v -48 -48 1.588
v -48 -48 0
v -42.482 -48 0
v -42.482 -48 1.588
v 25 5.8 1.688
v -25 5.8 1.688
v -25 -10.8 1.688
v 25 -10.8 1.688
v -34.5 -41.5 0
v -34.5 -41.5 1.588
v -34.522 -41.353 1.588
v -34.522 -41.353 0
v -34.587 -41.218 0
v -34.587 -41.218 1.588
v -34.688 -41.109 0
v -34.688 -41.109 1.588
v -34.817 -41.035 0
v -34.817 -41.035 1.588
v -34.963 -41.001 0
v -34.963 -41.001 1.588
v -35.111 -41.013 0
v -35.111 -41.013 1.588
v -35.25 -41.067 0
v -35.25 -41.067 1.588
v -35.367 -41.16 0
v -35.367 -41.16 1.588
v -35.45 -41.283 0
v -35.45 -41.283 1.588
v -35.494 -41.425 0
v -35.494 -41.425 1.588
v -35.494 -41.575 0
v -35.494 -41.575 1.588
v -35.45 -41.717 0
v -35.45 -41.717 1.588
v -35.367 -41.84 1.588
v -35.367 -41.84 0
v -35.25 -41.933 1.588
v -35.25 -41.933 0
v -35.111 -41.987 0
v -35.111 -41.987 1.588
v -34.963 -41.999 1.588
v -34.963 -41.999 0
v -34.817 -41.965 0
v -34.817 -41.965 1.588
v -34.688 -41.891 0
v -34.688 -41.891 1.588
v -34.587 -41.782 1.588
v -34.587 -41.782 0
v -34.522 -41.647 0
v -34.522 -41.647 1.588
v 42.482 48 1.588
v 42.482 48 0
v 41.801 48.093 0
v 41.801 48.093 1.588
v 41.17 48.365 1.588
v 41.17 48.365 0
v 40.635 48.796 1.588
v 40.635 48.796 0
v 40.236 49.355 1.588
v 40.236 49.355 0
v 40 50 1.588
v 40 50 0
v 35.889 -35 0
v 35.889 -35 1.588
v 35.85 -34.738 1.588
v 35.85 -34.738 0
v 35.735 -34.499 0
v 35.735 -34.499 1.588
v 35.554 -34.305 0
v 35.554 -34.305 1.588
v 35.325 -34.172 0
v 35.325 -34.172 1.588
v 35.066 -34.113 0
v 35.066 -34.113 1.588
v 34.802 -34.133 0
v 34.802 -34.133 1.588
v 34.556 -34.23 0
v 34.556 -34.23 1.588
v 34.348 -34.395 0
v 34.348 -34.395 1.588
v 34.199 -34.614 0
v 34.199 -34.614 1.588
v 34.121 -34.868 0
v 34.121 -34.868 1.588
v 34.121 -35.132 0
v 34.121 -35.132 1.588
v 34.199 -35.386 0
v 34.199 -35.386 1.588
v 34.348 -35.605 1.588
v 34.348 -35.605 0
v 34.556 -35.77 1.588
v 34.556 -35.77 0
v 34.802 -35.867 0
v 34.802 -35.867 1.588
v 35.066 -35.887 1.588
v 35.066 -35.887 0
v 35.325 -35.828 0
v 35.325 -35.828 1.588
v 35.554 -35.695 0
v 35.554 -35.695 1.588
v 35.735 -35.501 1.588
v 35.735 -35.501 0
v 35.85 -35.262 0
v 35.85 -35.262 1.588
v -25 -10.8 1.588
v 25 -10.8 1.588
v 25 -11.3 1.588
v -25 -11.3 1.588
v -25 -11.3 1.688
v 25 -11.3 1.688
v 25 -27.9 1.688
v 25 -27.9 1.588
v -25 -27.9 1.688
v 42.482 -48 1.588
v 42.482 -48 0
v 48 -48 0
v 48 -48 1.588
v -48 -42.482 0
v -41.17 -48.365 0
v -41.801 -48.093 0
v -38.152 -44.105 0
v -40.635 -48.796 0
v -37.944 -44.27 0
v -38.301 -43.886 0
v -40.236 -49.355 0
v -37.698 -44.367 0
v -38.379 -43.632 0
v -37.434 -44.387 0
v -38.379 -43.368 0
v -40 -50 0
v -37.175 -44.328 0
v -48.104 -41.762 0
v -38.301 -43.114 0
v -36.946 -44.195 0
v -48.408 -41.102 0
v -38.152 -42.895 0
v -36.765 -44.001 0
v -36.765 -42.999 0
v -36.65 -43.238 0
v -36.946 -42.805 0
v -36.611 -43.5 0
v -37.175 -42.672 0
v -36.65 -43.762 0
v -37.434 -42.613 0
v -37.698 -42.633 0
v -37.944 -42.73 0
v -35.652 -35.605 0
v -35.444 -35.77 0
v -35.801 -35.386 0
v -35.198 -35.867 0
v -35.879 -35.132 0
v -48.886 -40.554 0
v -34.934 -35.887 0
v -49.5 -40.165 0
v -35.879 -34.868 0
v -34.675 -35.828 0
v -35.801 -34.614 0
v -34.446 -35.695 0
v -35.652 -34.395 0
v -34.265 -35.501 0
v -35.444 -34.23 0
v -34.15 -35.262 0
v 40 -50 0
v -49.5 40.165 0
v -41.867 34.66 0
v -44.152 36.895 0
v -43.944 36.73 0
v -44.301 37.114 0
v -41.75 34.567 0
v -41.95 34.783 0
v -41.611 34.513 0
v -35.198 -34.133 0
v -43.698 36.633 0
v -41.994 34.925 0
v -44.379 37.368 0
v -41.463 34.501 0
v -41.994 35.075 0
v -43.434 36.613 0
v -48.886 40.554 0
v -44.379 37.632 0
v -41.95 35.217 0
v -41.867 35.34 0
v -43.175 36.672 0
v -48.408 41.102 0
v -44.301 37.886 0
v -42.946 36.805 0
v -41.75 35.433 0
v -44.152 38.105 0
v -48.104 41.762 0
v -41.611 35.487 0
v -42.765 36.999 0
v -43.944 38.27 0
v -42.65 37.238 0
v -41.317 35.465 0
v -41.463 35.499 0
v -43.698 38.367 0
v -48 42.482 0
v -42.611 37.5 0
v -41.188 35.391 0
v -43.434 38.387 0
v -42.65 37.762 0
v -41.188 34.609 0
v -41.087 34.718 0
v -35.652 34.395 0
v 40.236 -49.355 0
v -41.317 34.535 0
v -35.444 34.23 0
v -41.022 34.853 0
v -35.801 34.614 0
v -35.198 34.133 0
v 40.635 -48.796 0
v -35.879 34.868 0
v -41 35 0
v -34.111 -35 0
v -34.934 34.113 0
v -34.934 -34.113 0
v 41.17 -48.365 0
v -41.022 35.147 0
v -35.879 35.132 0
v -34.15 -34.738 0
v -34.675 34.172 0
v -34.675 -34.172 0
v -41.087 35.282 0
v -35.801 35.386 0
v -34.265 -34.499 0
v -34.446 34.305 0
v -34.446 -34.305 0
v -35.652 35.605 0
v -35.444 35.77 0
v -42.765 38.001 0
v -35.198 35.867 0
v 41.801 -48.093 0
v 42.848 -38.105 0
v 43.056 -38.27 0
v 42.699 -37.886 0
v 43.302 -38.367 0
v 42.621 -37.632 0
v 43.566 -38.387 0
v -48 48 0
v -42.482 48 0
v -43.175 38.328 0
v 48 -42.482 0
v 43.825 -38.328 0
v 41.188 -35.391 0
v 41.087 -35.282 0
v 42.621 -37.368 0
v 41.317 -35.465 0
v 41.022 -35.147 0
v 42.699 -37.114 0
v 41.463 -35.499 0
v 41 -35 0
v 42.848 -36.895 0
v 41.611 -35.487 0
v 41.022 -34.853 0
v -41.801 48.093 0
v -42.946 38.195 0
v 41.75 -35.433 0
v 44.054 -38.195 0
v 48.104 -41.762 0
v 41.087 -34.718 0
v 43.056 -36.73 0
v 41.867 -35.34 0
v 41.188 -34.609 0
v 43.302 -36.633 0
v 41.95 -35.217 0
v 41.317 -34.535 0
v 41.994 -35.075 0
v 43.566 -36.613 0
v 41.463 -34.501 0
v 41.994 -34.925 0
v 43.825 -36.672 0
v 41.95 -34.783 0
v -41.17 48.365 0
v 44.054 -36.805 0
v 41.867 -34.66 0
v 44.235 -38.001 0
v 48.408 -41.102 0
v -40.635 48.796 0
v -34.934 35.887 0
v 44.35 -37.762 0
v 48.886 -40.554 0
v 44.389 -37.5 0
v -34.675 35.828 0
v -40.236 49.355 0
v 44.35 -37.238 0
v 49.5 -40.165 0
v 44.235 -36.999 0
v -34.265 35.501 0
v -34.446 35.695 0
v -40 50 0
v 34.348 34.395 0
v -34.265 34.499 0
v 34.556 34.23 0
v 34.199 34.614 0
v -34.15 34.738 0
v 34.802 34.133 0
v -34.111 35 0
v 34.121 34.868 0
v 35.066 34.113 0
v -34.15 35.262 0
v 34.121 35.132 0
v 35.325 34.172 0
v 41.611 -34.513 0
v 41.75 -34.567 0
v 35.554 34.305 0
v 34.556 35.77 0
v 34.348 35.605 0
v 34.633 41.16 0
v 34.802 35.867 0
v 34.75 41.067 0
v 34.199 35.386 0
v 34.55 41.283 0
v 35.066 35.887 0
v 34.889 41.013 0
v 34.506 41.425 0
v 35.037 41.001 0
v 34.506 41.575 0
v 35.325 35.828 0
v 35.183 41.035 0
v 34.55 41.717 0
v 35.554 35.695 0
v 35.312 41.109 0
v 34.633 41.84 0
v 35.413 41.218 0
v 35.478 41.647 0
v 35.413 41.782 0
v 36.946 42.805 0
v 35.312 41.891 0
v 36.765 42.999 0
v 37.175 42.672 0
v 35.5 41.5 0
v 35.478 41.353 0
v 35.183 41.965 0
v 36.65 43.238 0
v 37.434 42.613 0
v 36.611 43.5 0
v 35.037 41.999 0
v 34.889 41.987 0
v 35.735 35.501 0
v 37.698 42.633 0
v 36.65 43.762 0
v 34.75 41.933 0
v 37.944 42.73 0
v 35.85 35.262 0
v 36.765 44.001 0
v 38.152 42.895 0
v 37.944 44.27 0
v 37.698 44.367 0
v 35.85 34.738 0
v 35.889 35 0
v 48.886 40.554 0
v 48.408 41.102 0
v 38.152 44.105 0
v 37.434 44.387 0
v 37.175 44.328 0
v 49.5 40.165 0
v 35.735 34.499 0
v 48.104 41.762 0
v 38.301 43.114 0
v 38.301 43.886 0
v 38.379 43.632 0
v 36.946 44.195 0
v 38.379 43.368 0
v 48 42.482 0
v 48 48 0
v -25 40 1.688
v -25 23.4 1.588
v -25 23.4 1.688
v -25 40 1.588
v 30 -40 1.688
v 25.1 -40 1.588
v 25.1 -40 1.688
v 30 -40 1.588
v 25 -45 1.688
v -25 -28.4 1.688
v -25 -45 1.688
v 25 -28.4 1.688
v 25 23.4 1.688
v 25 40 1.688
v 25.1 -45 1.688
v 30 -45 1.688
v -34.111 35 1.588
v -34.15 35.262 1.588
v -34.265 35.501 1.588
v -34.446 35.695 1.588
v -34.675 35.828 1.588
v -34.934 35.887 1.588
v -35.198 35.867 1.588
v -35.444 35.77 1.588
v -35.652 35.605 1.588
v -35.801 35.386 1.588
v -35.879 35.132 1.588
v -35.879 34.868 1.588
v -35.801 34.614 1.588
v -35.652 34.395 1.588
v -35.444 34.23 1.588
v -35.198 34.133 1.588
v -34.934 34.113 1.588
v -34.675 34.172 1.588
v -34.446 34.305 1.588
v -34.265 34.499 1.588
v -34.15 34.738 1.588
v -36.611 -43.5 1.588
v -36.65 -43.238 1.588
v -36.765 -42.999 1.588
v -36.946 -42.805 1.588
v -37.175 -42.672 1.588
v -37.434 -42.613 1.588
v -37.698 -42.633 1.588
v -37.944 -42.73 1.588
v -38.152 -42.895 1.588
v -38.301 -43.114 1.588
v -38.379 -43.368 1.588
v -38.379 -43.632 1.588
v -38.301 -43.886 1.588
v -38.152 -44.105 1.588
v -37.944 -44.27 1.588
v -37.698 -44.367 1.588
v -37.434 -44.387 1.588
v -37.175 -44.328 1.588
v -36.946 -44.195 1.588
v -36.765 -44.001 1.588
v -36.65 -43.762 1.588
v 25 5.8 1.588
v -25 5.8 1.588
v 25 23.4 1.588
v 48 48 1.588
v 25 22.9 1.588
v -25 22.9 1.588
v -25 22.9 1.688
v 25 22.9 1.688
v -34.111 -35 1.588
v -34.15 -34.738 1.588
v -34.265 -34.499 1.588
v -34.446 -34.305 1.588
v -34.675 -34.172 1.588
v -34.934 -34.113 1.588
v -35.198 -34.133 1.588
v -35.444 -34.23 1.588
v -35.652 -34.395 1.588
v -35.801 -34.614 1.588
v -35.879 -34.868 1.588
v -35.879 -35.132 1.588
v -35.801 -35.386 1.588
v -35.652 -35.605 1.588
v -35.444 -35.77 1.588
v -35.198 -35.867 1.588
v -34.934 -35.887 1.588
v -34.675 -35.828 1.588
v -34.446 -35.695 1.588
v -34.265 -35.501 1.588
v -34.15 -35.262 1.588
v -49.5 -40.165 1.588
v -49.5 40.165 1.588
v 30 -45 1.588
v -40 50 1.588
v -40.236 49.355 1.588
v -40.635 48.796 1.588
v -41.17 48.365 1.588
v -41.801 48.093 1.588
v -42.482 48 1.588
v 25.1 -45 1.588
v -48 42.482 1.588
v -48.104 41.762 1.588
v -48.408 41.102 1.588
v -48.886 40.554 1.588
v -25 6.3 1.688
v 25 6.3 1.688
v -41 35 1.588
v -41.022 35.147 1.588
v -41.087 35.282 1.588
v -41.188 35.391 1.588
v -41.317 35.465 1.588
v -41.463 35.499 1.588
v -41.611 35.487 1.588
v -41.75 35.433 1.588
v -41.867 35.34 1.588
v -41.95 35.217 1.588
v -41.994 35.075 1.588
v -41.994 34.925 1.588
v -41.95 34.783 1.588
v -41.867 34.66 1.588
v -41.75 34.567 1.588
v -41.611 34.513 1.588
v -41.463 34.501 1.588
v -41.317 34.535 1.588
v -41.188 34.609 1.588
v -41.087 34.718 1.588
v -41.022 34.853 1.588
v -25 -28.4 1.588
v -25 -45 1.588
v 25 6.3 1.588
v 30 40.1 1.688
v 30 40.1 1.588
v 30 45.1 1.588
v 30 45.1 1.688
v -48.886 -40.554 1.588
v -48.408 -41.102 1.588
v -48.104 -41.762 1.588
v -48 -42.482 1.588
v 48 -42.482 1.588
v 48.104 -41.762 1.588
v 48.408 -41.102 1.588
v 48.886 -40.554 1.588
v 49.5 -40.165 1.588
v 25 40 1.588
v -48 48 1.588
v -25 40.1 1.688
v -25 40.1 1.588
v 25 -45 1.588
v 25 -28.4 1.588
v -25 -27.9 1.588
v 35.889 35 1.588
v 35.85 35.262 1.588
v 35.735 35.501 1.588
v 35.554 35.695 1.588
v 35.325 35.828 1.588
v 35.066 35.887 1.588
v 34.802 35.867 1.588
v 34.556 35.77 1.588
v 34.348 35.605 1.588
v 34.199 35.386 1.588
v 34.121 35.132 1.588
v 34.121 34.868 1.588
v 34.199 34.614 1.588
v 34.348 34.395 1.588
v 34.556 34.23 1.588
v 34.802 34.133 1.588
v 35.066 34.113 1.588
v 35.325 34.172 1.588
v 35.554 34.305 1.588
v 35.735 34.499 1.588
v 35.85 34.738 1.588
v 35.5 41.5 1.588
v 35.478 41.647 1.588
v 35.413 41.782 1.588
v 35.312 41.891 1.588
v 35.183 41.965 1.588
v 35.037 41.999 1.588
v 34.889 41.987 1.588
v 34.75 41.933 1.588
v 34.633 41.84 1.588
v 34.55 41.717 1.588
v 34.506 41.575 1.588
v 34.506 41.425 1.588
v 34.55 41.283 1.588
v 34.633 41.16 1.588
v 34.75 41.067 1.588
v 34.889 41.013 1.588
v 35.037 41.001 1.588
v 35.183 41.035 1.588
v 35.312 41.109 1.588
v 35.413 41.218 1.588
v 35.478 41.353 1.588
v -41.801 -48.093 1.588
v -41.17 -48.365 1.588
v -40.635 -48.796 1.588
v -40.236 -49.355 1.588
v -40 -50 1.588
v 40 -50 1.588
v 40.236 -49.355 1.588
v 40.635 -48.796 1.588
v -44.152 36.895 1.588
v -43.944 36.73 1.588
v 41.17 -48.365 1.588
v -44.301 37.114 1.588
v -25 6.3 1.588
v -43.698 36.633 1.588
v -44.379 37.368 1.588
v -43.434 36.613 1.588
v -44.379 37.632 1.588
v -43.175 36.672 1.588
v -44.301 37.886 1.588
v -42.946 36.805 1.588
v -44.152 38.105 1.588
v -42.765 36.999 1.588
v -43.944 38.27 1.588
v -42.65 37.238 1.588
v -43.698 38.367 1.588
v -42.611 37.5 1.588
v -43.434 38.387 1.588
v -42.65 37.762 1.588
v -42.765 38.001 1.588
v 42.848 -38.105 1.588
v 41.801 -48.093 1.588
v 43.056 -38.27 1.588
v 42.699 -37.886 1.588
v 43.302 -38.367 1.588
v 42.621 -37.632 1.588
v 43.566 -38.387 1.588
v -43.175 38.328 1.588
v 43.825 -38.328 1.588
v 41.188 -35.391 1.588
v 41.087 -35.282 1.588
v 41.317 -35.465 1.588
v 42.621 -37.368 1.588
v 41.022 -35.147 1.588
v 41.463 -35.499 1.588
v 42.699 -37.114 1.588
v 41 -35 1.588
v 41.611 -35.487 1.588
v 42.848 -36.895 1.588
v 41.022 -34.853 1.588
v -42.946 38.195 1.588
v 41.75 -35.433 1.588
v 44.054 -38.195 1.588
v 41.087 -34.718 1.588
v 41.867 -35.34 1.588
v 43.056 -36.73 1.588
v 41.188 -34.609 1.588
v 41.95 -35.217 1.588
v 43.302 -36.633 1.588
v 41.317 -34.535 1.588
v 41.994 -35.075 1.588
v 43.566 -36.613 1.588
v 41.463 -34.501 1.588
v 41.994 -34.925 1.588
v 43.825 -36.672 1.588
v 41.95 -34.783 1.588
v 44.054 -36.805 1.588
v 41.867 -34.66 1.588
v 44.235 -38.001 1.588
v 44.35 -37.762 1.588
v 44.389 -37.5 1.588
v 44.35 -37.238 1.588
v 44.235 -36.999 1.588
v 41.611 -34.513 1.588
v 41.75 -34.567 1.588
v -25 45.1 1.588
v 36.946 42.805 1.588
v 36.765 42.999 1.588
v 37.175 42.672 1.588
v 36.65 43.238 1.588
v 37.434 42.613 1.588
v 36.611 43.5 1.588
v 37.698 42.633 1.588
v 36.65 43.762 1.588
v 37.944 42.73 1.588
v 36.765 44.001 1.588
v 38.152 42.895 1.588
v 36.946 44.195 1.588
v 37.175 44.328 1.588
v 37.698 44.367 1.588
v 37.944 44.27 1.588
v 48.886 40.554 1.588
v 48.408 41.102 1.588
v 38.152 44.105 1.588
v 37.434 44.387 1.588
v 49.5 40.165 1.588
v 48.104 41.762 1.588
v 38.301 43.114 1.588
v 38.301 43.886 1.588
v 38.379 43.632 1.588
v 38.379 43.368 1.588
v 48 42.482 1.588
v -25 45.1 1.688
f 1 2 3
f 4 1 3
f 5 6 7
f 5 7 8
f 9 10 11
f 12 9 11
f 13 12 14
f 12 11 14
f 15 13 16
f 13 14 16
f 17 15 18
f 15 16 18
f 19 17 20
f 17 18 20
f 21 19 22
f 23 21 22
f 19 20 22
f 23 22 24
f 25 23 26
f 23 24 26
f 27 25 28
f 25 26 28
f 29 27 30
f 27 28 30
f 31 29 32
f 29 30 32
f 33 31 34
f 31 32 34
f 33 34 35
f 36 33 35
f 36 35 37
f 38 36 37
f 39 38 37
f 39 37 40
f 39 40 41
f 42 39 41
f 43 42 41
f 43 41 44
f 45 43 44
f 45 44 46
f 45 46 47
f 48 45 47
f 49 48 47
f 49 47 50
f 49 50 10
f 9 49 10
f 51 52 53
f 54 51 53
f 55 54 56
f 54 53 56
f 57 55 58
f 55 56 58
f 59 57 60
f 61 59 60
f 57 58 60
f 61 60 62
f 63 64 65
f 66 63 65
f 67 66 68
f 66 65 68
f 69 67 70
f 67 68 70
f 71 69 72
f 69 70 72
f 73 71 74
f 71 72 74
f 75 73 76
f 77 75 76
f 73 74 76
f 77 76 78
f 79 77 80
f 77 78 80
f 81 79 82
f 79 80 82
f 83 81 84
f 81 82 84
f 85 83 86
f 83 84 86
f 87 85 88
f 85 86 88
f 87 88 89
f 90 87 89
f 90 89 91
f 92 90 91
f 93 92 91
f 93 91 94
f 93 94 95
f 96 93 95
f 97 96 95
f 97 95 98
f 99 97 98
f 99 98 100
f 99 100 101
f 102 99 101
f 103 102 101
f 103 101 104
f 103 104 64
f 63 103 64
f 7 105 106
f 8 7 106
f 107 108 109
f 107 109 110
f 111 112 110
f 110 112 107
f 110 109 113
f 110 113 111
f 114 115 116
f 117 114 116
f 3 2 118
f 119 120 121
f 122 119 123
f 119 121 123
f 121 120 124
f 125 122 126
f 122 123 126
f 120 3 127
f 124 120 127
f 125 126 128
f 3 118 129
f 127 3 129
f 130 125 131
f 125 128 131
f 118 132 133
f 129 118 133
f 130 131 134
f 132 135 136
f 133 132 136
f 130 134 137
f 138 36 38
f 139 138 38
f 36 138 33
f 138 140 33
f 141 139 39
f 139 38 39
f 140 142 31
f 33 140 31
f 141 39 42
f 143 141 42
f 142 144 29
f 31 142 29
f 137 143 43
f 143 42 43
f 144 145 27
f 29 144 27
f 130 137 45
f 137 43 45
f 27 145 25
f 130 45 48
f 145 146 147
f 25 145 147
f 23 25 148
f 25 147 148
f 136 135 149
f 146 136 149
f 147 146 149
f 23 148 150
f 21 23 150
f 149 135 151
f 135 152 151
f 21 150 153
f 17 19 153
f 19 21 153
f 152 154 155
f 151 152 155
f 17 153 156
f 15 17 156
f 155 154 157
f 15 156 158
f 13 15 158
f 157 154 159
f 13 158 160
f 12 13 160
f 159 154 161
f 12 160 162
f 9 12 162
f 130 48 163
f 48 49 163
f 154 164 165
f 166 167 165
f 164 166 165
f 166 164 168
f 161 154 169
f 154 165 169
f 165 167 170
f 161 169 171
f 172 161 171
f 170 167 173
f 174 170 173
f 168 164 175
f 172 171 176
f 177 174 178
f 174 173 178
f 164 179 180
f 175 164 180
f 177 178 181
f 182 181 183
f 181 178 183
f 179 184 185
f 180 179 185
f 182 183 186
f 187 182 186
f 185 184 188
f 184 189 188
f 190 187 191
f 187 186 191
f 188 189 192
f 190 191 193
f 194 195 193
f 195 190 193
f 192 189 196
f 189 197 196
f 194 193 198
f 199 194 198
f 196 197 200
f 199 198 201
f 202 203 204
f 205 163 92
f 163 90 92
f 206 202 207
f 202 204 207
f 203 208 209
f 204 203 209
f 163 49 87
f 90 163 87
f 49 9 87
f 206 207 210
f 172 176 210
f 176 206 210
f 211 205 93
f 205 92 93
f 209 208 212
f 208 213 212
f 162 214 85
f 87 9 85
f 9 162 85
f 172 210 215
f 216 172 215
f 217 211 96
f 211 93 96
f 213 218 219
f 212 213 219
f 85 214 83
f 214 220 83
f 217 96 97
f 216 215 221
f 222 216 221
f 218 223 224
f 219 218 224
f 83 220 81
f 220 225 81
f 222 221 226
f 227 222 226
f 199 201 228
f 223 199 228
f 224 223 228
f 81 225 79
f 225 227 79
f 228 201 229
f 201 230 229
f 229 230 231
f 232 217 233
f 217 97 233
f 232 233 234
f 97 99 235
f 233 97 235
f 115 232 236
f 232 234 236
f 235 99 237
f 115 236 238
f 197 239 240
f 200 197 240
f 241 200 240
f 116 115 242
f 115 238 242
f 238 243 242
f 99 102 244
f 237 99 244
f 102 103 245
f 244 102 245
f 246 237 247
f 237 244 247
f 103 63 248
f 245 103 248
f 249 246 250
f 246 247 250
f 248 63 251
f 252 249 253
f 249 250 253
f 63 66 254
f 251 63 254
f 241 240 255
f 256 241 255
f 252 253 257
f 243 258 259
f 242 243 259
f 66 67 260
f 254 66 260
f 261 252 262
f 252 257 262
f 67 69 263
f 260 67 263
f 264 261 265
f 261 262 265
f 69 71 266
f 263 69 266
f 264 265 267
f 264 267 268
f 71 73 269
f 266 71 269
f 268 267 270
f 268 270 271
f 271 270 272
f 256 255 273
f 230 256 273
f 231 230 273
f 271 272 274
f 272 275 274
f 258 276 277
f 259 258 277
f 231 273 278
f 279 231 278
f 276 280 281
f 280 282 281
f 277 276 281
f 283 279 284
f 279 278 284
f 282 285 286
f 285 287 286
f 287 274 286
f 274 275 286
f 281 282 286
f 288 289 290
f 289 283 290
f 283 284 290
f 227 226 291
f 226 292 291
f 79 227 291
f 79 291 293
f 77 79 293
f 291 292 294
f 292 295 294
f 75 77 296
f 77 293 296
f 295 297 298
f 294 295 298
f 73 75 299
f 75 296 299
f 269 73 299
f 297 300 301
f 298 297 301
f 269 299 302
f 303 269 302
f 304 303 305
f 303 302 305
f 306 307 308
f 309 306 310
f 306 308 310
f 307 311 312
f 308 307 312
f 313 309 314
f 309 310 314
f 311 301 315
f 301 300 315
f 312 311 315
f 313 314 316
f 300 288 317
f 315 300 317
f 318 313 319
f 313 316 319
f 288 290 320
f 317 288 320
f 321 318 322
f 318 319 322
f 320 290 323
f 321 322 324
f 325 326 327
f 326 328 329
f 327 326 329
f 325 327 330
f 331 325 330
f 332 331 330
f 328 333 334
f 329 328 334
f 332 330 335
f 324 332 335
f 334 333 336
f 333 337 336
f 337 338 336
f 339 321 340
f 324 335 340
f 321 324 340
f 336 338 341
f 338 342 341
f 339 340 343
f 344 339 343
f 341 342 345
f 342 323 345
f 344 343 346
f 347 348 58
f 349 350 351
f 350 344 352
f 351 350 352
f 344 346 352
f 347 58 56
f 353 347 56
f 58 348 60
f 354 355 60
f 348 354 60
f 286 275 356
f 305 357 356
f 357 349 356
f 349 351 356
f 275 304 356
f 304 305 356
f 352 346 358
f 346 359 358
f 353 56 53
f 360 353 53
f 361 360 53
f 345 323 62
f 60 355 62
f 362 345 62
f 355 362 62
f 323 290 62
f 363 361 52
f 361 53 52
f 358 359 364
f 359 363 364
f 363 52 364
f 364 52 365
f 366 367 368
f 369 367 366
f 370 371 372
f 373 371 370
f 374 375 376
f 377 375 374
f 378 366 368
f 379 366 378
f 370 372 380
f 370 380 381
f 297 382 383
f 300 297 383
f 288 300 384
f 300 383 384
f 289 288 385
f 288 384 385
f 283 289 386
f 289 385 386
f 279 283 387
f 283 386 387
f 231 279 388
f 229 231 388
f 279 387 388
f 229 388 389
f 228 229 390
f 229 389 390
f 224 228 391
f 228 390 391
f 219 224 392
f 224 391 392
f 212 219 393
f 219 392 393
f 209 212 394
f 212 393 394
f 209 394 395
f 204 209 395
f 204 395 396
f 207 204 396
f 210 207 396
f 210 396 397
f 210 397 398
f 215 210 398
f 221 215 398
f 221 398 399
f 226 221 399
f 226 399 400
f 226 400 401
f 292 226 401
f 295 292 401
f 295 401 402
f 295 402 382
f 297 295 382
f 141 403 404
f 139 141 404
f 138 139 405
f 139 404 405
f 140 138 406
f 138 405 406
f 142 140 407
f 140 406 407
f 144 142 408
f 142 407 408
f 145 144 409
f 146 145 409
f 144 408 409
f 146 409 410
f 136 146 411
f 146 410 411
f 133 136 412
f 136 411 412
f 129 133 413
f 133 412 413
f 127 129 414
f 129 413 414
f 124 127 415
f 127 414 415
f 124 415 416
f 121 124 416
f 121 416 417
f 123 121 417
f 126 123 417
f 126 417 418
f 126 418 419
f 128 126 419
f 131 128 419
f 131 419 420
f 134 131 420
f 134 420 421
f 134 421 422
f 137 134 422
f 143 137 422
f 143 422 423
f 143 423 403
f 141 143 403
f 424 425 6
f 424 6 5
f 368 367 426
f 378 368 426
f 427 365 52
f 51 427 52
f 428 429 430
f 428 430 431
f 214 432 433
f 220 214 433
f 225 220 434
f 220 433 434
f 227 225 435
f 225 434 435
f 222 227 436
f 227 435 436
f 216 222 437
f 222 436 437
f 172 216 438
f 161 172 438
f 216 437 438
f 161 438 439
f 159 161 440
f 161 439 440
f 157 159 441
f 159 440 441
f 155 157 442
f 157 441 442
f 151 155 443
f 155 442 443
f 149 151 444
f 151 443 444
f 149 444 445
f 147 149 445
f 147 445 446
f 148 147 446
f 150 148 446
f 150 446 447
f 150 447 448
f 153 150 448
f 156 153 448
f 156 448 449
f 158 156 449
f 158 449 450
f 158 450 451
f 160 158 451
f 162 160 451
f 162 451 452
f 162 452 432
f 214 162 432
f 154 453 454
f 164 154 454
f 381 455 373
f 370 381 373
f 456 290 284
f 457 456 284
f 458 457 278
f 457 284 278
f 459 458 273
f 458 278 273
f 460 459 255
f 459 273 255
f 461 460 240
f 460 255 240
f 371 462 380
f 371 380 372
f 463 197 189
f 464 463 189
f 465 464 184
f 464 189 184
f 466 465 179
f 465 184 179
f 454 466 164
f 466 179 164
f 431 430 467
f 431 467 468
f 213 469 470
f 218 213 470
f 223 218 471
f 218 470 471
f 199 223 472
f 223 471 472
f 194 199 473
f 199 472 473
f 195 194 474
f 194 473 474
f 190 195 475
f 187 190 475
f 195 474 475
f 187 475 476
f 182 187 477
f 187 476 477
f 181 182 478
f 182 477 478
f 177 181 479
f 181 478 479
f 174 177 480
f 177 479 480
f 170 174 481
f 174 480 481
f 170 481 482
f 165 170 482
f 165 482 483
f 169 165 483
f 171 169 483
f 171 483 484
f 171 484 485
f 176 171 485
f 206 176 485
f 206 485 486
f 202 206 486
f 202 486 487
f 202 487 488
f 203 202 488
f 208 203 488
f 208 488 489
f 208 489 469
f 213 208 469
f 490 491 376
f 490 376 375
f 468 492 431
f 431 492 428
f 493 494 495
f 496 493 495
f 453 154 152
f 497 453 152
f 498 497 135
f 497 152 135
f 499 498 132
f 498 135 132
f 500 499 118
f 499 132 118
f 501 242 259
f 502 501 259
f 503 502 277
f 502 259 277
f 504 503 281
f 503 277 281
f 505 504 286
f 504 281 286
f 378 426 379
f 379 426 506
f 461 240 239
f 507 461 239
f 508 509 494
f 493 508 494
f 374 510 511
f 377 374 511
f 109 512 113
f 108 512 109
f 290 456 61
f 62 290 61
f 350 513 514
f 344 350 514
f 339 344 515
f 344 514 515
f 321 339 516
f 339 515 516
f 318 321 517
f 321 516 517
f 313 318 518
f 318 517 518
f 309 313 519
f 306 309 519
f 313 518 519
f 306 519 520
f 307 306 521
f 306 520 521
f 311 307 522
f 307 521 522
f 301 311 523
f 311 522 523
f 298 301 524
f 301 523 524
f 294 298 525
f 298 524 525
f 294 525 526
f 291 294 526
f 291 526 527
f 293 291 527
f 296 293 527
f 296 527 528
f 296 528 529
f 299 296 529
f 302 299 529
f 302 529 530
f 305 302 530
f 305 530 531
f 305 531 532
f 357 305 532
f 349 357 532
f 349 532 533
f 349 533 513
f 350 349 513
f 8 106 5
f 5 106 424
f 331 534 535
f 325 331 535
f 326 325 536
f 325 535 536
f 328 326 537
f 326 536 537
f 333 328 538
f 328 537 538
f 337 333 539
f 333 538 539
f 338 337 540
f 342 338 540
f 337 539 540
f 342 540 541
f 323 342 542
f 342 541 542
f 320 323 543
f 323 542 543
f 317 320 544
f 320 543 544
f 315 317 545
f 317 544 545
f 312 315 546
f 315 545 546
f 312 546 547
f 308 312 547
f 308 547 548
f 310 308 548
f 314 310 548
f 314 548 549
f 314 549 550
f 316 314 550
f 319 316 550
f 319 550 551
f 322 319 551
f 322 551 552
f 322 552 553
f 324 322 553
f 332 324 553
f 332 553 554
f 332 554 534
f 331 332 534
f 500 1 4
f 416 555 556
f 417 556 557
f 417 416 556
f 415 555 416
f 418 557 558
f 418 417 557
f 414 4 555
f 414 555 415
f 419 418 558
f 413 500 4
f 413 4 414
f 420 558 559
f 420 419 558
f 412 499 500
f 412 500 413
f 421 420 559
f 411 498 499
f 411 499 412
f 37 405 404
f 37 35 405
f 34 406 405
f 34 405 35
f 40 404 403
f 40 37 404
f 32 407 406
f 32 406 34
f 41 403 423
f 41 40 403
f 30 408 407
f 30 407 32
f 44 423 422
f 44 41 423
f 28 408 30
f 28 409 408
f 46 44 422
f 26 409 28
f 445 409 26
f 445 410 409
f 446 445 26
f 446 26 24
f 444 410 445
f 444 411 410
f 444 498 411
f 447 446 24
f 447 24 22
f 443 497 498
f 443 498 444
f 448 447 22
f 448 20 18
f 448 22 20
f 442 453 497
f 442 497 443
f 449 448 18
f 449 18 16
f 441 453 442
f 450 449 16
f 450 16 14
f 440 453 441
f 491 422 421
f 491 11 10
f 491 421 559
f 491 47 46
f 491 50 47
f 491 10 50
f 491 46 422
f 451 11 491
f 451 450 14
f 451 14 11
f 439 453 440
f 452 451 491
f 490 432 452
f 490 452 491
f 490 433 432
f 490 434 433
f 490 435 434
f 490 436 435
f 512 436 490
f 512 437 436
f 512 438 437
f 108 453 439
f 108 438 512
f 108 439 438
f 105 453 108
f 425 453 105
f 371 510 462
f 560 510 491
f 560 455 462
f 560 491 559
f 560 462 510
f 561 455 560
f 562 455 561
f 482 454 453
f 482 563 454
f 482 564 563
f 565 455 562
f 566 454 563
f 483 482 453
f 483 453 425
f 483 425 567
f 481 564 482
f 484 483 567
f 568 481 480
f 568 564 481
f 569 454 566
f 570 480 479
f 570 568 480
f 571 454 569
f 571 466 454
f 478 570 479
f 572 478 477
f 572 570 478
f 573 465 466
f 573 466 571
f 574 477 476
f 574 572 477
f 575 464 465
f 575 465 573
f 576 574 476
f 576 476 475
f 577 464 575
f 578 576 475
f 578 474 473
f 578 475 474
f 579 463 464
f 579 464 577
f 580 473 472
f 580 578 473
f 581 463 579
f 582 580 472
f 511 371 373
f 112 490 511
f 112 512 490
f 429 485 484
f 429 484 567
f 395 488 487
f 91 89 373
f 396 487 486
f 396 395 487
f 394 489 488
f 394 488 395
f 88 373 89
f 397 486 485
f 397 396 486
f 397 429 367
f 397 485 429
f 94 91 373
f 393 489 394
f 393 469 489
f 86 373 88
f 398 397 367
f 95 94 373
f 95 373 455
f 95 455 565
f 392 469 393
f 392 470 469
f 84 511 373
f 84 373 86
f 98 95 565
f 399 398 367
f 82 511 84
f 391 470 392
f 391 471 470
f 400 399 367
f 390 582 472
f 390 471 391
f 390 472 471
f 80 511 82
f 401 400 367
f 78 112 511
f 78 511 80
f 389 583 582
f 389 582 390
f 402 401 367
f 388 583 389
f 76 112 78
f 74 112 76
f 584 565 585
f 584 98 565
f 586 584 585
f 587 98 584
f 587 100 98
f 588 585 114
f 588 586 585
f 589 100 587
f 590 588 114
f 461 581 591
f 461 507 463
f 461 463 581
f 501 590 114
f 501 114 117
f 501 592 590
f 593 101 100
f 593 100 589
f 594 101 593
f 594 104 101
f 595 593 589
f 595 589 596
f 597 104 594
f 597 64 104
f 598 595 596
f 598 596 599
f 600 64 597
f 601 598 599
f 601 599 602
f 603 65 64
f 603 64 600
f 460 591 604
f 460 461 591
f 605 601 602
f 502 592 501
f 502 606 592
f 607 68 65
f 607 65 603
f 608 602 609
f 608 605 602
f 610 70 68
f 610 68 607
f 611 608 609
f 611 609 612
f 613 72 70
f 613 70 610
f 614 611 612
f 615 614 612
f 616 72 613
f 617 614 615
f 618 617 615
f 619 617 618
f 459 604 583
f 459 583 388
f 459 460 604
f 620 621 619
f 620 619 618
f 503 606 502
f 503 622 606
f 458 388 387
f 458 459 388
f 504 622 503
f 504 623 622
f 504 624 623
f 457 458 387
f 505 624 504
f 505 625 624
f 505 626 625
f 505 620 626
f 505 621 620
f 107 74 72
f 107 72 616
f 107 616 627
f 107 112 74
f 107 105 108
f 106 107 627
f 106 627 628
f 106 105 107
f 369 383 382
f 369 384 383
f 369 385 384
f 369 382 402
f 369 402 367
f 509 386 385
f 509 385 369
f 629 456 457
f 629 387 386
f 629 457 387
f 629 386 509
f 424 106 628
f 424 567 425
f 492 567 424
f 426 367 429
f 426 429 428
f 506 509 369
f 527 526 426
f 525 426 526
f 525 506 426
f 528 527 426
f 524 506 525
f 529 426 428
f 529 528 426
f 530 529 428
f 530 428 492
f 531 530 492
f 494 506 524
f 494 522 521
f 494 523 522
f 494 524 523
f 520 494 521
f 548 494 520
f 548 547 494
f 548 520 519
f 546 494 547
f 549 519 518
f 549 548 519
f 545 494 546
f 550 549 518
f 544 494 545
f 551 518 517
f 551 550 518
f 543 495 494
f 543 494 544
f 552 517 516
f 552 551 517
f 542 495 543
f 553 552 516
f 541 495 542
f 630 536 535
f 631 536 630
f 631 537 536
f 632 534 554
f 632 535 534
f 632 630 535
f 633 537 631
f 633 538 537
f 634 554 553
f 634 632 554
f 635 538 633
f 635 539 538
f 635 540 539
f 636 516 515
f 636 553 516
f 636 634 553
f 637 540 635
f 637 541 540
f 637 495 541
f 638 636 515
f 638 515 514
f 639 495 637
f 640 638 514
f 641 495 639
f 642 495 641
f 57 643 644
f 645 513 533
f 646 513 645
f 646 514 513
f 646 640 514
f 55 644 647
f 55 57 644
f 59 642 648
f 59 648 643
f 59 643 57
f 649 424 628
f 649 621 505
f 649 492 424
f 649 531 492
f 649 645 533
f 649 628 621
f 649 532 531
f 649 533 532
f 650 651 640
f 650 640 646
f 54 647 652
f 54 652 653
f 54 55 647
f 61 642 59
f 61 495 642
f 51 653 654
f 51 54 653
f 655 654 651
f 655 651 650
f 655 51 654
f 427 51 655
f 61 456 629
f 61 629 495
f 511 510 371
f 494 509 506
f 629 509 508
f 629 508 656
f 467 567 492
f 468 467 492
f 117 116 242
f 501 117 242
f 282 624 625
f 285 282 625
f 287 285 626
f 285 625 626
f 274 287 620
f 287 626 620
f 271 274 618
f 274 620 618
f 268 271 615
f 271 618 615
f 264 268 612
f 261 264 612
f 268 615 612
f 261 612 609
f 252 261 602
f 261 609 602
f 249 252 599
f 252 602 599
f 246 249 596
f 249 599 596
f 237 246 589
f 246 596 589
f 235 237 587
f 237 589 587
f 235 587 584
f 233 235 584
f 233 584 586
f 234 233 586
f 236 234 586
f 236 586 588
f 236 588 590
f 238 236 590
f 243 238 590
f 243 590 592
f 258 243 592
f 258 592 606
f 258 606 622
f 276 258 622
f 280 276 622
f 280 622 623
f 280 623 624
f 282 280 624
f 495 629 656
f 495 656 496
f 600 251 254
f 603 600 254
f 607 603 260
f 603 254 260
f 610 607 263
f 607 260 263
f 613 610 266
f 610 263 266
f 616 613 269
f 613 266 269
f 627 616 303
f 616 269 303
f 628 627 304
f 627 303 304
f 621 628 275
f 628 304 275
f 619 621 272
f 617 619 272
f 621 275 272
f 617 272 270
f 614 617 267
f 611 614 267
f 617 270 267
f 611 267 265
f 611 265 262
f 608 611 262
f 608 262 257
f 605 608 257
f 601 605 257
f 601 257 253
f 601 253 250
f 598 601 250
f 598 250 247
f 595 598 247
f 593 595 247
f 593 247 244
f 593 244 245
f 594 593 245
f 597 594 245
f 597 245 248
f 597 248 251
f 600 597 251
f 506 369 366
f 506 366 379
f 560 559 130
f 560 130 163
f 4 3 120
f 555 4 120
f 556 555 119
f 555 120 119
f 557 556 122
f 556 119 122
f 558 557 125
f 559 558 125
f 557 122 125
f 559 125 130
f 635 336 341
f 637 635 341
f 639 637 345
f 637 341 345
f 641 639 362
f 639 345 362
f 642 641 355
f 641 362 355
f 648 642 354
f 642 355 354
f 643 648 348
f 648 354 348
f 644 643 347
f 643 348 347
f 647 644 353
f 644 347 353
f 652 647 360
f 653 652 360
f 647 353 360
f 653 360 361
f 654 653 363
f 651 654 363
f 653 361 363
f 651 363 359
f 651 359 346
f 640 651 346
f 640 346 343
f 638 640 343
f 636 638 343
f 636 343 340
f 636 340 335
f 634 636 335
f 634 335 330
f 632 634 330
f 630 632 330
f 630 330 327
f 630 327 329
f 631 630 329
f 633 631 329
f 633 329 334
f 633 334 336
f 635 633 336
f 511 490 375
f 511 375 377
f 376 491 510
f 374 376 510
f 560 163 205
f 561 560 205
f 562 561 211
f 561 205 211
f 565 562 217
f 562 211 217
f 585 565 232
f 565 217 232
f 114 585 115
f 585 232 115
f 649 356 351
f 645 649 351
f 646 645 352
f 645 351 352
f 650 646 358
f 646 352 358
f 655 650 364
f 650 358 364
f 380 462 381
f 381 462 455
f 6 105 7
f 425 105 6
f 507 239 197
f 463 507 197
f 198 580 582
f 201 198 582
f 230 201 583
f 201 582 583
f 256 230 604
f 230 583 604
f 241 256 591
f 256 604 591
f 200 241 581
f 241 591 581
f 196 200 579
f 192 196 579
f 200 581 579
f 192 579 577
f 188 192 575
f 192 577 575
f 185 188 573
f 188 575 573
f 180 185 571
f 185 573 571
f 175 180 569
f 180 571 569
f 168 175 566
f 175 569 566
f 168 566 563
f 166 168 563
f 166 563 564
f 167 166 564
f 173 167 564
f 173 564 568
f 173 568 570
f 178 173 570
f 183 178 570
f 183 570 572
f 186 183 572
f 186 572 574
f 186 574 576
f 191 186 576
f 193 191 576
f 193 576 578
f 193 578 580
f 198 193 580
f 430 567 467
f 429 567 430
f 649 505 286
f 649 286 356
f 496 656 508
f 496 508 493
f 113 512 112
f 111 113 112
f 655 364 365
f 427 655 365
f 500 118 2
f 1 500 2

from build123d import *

# Parameters (mm, degrees)
SKETCH1_W                      = 99
SKETCH1_H                      = 100
BOSS_EXTRUDE1_DEPTH            = 1.5875
CUT_EXTRUDE1_DEPTH             = 71.375920287
CUT_EXTRUDE2_DEPTH             = 71.375920287
CUT_EXTRUDE3_DEPTH             = 71.375920287
CUT_EXTRUDE4_DEPTH             = 71.375920287
CUT_EXTRUDE5_DEPTH             = 71.375920287
CUT_EXTRUDE6_DEPTH             = 71.375920287
CUT_EXTRUDE7_DEPTH             = 71.375920287
CUT_EXTRUDE8_DEPTH             = 71.375920287
SKETCH10_W                     = 50
SKETCH10_H                     = 16.6
BOSS_EXTRUDE2_DEPTH            = 0.1
SKETCH11_W                     = 50
SKETCH11_H                     = 16.6
BOSS_EXTRUDE3_DEPTH            = 0.1
SKETCH12_W                     = 50
SKETCH12_H                     = 16.6
BOSS_EXTRUDE4_DEPTH            = 0.1
SKETCH13_W                     = 50
SKETCH13_H                     = 16.6
BOSS_EXTRUDE5_DEPTH            = 0.1
SKETCH14_W                     = 50
SKETCH14_H                     = 16.6
BOSS_EXTRUDE6_DEPTH            = 0.1
SKETCH15_W                     = 55
SKETCH15_H                     = 5
BOSS_EXTRUDE7_DEPTH            = 0.1
SKETCH16_W                     = 4.9
SKETCH16_H                     = 5
BOSS_EXTRUDE8_DEPTH            = 0.1
F_000_CLEARANCE_HOLE1_D        = 1
F_000_CLEARANCE_HOLE2_D        = 1
F_000_CLEARANCE_HOLE2_DEPTH    = 1.6875
F_50_0_07_DIAMETER_HOLE1_D     = 1.778
F_50_0_07_DIAMETER_HOLE1_DEPTH = 1.6875
F_50_0_07_DIAMETER_HOLE2_D     = 1.778


with BuildPart() as part:
    # Sketch1 → Boss-Extrude1 (new body)
    with BuildSketch(Plane.XY.offset(1.5875)):
        Rectangle(SKETCH1_W, SKETCH1_H)
    extrude(amount=-BOSS_EXTRUDE1_DEPTH)

    # Sketch2 → Cut-Extrude1 (cut, through all)
    with BuildSketch(Plane(origin=(0, 0, 0), x_dir=(-1, 0, 0), z_dir=(0, 0, -1))):
        with BuildLine():
            Line((48, -42.481934729), (48, -50))
            Line((48, -50), (49.5, -50))
            Line((49.5, -50), (49.5, -40.164608684))
            ThreePointArc((49.5, -40.164608684), (48.40772422, -41.101717355), (48, -42.481934729))
        make_face()
    extrude(amount=-CUT_EXTRUDE1_DEPTH, mode=Mode.SUBTRACT)

    # Sketch3 → Cut-Extrude2 (cut, through all)
    with BuildSketch(Plane(origin=(0, 0, 0), x_dir=(-1, 0, 0), z_dir=(0, 0, -1))):
        with BuildLine():
            Line((48, -48), (42.481934729, -48))
            ThreePointArc((42.481934729, -48), (40.888196984, -48.562223471), (40, -50))
            Line((40, -50), (48, -50))
            Line((48, -50), (48, -48))
        make_face()
    extrude(amount=-CUT_EXTRUDE2_DEPTH, mode=Mode.SUBTRACT)

    # Sketch4 → Cut-Extrude3 (cut, through all)
    with BuildSketch(Plane(origin=(0, 0, 0), x_dir=(-1, 0, 0), z_dir=(0, 0, -1))):
        with BuildLine():
            Line((-42.481934729, -48), (-49.5, -48))
            Line((-49.5, -48), (-49.5, -50))
            Line((-49.5, -50), (-40, -50))
            ThreePointArc((-40, -50), (-40.888196984, -48.562223471), (-42.481934729, -48))
        make_face()
    extrude(amount=-CUT_EXTRUDE3_DEPTH, mode=Mode.SUBTRACT)

    # Sketch5 → Cut-Extrude4 (cut, through all)
    with BuildSketch(Plane(origin=(0, 0, 0), x_dir=(-1, 0, 0), z_dir=(0, 0, -1))):
        with BuildLine():
            Line((-48, -48), (-48, -42.481934729))
            ThreePointArc((-48, -42.481934729), (-48.40772422, -41.101717355), (-49.5, -40.164608684))
            Line((-49.5, -40.164608684), (-49.5, -48))
            Line((-49.5, -48), (-48, -48))
        make_face()
    extrude(amount=-CUT_EXTRUDE4_DEPTH, mode=Mode.SUBTRACT)

    # Sketch6 → Cut-Extrude5 (cut, through all)
    with BuildSketch(Plane(origin=(0, 0, 0), x_dir=(-1, 0, 0), z_dir=(0, 0, -1))):
        with BuildLine():
            Line((-48, 42.481934729), (-48, 50))
            Line((-48, 50), (-49.5, 50))
            Line((-49.5, 50), (-49.5, 40.164608684))
            ThreePointArc((-49.5, 40.164608684), (-48.40772422, 41.101717355), (-48, 42.481934729))
        make_face()
    extrude(amount=-CUT_EXTRUDE5_DEPTH, mode=Mode.SUBTRACT)

    # Sketch7 → Cut-Extrude6 (cut, through all)
    with BuildSketch(Plane(origin=(0, 0, 0), x_dir=(-1, 0, 0), z_dir=(0, 0, -1))):
        with BuildLine():
            Line((-48, 48), (-42.481934729, 48))
            ThreePointArc((-42.481934729, 48), (-40.888196984, 48.562223471), (-40, 50))
            Line((-40, 50), (-48, 50))
            Line((-48, 50), (-48, 48))
        make_face()
    extrude(amount=-CUT_EXTRUDE6_DEPTH, mode=Mode.SUBTRACT)

    # Sketch8 → Cut-Extrude7 (cut, through all)
    with BuildSketch(Plane(origin=(0, 0, 0), x_dir=(-1, 0, 0), z_dir=(0, 0, -1))):
        with BuildLine():
            Line((42.481934729, 48), (49.5, 48))
            Line((49.5, 48), (49.5, 50))
            Line((49.5, 50), (40, 50))
            ThreePointArc((40, 50), (40.888196984, 48.562223471), (42.481934729, 48))
        make_face()
    extrude(amount=-CUT_EXTRUDE7_DEPTH, mode=Mode.SUBTRACT)

    # Sketch9 → Cut-Extrude8 (cut, through all)
    with BuildSketch(Plane(origin=(0, 0, 0), x_dir=(-1, 0, 0), z_dir=(0, 0, -1))):
        with BuildLine():
            Line((48, 48), (48, 42.481934729))
            ThreePointArc((48, 42.481934729), (48.40772422, 41.101717355), (49.5, 40.164608684))
            Line((49.5, 40.164608684), (49.5, 48))
            Line((49.5, 48), (48, 48))
        make_face()
    extrude(amount=-CUT_EXTRUDE8_DEPTH, mode=Mode.SUBTRACT)

    # Sketch10 → Boss-Extrude2 (add)
    with BuildSketch(Plane.XY.offset(1.5875)):
        with Locations((0, 31.7)):
            Rectangle(SKETCH10_W, SKETCH10_H)
    extrude(amount=BOSS_EXTRUDE2_DEPTH)

    # Sketch11 → Boss-Extrude3 (add)
    with BuildSketch(Plane.XY.offset(1.5875)):
        with Locations((0, 14.6)):
            Rectangle(SKETCH11_W, SKETCH11_H)
    extrude(amount=BOSS_EXTRUDE3_DEPTH)

    # Sketch12 → Boss-Extrude4 (add)
    with BuildSketch(Plane.XY.offset(1.5875)):
        with Locations((0, -2.5)):
            Rectangle(SKETCH12_W, SKETCH12_H)
    extrude(amount=BOSS_EXTRUDE4_DEPTH)

    # Sketch13 → Boss-Extrude5 (add)
    with BuildSketch(Plane.XY.offset(1.5875)):
        with Locations((0, -19.6)):
            Rectangle(SKETCH13_W, SKETCH13_H)
    extrude(amount=BOSS_EXTRUDE5_DEPTH)

    # Sketch14 → Boss-Extrude6 (add)
    with BuildSketch(Plane.XY.offset(1.5875)):
        with Locations((0, -36.7)):
            Rectangle(SKETCH14_W, SKETCH14_H)
    extrude(amount=BOSS_EXTRUDE6_DEPTH)

    # Sketch15 → Boss-Extrude7 (add)
    with BuildSketch(Plane.XY.offset(1.5875)):
        with Locations((2.5, 42.6)):
            Rectangle(SKETCH15_W, SKETCH15_H)
    extrude(amount=BOSS_EXTRUDE7_DEPTH)

    # Sketch16 → Boss-Extrude8 (add)
    with BuildSketch(Plane.XY.offset(1.5875)):
        with Locations((27.55, -42.5)):
            Rectangle(SKETCH16_W, SKETCH16_H)
    extrude(amount=BOSS_EXTRUDE8_DEPTH)

    # #000 Clearance Hole1 (through all)
    with Locations(Plane.XY.offset(1.5875)):
        with Locations((41.5, -35)):
            Hole(F_000_CLEARANCE_HOLE1_D / 2)

    # #000 Clearance Hole2
    with Locations(Plane(origin=(0, 0, 0), x_dir=(-1, 0, 0), z_dir=(0, 0, -1))):
        with Locations((-35, 41.5), (35, -41.5), (41.5, 35)):
            Hole(F_000_CLEARANCE_HOLE2_D / 2, depth=F_000_CLEARANCE_HOLE2_DEPTH)

    # #50 (0.07) Diameter Hole1
    with Locations(Plane(origin=(0, 0, 0), x_dir=(-1, 0, 0), z_dir=(0, 0, -1))):
        with Locations((-35, 35), (-43.5, -37.5), (-35, -35), (37.5, -43.5), (35, -35), (43.5, 37.5), (35, 35)):
            Hole(F_50_0_07_DIAMETER_HOLE1_D / 2, depth=F_50_0_07_DIAMETER_HOLE1_DEPTH)

    # #50 (0.07) Diameter Hole2 (through all)
    with Locations(Plane.XY.offset(1.5875)):
        with Locations((37.5, 43.5)):
            Hole(F_50_0_07_DIAMETER_HOLE2_D / 2)


solid = part.part
